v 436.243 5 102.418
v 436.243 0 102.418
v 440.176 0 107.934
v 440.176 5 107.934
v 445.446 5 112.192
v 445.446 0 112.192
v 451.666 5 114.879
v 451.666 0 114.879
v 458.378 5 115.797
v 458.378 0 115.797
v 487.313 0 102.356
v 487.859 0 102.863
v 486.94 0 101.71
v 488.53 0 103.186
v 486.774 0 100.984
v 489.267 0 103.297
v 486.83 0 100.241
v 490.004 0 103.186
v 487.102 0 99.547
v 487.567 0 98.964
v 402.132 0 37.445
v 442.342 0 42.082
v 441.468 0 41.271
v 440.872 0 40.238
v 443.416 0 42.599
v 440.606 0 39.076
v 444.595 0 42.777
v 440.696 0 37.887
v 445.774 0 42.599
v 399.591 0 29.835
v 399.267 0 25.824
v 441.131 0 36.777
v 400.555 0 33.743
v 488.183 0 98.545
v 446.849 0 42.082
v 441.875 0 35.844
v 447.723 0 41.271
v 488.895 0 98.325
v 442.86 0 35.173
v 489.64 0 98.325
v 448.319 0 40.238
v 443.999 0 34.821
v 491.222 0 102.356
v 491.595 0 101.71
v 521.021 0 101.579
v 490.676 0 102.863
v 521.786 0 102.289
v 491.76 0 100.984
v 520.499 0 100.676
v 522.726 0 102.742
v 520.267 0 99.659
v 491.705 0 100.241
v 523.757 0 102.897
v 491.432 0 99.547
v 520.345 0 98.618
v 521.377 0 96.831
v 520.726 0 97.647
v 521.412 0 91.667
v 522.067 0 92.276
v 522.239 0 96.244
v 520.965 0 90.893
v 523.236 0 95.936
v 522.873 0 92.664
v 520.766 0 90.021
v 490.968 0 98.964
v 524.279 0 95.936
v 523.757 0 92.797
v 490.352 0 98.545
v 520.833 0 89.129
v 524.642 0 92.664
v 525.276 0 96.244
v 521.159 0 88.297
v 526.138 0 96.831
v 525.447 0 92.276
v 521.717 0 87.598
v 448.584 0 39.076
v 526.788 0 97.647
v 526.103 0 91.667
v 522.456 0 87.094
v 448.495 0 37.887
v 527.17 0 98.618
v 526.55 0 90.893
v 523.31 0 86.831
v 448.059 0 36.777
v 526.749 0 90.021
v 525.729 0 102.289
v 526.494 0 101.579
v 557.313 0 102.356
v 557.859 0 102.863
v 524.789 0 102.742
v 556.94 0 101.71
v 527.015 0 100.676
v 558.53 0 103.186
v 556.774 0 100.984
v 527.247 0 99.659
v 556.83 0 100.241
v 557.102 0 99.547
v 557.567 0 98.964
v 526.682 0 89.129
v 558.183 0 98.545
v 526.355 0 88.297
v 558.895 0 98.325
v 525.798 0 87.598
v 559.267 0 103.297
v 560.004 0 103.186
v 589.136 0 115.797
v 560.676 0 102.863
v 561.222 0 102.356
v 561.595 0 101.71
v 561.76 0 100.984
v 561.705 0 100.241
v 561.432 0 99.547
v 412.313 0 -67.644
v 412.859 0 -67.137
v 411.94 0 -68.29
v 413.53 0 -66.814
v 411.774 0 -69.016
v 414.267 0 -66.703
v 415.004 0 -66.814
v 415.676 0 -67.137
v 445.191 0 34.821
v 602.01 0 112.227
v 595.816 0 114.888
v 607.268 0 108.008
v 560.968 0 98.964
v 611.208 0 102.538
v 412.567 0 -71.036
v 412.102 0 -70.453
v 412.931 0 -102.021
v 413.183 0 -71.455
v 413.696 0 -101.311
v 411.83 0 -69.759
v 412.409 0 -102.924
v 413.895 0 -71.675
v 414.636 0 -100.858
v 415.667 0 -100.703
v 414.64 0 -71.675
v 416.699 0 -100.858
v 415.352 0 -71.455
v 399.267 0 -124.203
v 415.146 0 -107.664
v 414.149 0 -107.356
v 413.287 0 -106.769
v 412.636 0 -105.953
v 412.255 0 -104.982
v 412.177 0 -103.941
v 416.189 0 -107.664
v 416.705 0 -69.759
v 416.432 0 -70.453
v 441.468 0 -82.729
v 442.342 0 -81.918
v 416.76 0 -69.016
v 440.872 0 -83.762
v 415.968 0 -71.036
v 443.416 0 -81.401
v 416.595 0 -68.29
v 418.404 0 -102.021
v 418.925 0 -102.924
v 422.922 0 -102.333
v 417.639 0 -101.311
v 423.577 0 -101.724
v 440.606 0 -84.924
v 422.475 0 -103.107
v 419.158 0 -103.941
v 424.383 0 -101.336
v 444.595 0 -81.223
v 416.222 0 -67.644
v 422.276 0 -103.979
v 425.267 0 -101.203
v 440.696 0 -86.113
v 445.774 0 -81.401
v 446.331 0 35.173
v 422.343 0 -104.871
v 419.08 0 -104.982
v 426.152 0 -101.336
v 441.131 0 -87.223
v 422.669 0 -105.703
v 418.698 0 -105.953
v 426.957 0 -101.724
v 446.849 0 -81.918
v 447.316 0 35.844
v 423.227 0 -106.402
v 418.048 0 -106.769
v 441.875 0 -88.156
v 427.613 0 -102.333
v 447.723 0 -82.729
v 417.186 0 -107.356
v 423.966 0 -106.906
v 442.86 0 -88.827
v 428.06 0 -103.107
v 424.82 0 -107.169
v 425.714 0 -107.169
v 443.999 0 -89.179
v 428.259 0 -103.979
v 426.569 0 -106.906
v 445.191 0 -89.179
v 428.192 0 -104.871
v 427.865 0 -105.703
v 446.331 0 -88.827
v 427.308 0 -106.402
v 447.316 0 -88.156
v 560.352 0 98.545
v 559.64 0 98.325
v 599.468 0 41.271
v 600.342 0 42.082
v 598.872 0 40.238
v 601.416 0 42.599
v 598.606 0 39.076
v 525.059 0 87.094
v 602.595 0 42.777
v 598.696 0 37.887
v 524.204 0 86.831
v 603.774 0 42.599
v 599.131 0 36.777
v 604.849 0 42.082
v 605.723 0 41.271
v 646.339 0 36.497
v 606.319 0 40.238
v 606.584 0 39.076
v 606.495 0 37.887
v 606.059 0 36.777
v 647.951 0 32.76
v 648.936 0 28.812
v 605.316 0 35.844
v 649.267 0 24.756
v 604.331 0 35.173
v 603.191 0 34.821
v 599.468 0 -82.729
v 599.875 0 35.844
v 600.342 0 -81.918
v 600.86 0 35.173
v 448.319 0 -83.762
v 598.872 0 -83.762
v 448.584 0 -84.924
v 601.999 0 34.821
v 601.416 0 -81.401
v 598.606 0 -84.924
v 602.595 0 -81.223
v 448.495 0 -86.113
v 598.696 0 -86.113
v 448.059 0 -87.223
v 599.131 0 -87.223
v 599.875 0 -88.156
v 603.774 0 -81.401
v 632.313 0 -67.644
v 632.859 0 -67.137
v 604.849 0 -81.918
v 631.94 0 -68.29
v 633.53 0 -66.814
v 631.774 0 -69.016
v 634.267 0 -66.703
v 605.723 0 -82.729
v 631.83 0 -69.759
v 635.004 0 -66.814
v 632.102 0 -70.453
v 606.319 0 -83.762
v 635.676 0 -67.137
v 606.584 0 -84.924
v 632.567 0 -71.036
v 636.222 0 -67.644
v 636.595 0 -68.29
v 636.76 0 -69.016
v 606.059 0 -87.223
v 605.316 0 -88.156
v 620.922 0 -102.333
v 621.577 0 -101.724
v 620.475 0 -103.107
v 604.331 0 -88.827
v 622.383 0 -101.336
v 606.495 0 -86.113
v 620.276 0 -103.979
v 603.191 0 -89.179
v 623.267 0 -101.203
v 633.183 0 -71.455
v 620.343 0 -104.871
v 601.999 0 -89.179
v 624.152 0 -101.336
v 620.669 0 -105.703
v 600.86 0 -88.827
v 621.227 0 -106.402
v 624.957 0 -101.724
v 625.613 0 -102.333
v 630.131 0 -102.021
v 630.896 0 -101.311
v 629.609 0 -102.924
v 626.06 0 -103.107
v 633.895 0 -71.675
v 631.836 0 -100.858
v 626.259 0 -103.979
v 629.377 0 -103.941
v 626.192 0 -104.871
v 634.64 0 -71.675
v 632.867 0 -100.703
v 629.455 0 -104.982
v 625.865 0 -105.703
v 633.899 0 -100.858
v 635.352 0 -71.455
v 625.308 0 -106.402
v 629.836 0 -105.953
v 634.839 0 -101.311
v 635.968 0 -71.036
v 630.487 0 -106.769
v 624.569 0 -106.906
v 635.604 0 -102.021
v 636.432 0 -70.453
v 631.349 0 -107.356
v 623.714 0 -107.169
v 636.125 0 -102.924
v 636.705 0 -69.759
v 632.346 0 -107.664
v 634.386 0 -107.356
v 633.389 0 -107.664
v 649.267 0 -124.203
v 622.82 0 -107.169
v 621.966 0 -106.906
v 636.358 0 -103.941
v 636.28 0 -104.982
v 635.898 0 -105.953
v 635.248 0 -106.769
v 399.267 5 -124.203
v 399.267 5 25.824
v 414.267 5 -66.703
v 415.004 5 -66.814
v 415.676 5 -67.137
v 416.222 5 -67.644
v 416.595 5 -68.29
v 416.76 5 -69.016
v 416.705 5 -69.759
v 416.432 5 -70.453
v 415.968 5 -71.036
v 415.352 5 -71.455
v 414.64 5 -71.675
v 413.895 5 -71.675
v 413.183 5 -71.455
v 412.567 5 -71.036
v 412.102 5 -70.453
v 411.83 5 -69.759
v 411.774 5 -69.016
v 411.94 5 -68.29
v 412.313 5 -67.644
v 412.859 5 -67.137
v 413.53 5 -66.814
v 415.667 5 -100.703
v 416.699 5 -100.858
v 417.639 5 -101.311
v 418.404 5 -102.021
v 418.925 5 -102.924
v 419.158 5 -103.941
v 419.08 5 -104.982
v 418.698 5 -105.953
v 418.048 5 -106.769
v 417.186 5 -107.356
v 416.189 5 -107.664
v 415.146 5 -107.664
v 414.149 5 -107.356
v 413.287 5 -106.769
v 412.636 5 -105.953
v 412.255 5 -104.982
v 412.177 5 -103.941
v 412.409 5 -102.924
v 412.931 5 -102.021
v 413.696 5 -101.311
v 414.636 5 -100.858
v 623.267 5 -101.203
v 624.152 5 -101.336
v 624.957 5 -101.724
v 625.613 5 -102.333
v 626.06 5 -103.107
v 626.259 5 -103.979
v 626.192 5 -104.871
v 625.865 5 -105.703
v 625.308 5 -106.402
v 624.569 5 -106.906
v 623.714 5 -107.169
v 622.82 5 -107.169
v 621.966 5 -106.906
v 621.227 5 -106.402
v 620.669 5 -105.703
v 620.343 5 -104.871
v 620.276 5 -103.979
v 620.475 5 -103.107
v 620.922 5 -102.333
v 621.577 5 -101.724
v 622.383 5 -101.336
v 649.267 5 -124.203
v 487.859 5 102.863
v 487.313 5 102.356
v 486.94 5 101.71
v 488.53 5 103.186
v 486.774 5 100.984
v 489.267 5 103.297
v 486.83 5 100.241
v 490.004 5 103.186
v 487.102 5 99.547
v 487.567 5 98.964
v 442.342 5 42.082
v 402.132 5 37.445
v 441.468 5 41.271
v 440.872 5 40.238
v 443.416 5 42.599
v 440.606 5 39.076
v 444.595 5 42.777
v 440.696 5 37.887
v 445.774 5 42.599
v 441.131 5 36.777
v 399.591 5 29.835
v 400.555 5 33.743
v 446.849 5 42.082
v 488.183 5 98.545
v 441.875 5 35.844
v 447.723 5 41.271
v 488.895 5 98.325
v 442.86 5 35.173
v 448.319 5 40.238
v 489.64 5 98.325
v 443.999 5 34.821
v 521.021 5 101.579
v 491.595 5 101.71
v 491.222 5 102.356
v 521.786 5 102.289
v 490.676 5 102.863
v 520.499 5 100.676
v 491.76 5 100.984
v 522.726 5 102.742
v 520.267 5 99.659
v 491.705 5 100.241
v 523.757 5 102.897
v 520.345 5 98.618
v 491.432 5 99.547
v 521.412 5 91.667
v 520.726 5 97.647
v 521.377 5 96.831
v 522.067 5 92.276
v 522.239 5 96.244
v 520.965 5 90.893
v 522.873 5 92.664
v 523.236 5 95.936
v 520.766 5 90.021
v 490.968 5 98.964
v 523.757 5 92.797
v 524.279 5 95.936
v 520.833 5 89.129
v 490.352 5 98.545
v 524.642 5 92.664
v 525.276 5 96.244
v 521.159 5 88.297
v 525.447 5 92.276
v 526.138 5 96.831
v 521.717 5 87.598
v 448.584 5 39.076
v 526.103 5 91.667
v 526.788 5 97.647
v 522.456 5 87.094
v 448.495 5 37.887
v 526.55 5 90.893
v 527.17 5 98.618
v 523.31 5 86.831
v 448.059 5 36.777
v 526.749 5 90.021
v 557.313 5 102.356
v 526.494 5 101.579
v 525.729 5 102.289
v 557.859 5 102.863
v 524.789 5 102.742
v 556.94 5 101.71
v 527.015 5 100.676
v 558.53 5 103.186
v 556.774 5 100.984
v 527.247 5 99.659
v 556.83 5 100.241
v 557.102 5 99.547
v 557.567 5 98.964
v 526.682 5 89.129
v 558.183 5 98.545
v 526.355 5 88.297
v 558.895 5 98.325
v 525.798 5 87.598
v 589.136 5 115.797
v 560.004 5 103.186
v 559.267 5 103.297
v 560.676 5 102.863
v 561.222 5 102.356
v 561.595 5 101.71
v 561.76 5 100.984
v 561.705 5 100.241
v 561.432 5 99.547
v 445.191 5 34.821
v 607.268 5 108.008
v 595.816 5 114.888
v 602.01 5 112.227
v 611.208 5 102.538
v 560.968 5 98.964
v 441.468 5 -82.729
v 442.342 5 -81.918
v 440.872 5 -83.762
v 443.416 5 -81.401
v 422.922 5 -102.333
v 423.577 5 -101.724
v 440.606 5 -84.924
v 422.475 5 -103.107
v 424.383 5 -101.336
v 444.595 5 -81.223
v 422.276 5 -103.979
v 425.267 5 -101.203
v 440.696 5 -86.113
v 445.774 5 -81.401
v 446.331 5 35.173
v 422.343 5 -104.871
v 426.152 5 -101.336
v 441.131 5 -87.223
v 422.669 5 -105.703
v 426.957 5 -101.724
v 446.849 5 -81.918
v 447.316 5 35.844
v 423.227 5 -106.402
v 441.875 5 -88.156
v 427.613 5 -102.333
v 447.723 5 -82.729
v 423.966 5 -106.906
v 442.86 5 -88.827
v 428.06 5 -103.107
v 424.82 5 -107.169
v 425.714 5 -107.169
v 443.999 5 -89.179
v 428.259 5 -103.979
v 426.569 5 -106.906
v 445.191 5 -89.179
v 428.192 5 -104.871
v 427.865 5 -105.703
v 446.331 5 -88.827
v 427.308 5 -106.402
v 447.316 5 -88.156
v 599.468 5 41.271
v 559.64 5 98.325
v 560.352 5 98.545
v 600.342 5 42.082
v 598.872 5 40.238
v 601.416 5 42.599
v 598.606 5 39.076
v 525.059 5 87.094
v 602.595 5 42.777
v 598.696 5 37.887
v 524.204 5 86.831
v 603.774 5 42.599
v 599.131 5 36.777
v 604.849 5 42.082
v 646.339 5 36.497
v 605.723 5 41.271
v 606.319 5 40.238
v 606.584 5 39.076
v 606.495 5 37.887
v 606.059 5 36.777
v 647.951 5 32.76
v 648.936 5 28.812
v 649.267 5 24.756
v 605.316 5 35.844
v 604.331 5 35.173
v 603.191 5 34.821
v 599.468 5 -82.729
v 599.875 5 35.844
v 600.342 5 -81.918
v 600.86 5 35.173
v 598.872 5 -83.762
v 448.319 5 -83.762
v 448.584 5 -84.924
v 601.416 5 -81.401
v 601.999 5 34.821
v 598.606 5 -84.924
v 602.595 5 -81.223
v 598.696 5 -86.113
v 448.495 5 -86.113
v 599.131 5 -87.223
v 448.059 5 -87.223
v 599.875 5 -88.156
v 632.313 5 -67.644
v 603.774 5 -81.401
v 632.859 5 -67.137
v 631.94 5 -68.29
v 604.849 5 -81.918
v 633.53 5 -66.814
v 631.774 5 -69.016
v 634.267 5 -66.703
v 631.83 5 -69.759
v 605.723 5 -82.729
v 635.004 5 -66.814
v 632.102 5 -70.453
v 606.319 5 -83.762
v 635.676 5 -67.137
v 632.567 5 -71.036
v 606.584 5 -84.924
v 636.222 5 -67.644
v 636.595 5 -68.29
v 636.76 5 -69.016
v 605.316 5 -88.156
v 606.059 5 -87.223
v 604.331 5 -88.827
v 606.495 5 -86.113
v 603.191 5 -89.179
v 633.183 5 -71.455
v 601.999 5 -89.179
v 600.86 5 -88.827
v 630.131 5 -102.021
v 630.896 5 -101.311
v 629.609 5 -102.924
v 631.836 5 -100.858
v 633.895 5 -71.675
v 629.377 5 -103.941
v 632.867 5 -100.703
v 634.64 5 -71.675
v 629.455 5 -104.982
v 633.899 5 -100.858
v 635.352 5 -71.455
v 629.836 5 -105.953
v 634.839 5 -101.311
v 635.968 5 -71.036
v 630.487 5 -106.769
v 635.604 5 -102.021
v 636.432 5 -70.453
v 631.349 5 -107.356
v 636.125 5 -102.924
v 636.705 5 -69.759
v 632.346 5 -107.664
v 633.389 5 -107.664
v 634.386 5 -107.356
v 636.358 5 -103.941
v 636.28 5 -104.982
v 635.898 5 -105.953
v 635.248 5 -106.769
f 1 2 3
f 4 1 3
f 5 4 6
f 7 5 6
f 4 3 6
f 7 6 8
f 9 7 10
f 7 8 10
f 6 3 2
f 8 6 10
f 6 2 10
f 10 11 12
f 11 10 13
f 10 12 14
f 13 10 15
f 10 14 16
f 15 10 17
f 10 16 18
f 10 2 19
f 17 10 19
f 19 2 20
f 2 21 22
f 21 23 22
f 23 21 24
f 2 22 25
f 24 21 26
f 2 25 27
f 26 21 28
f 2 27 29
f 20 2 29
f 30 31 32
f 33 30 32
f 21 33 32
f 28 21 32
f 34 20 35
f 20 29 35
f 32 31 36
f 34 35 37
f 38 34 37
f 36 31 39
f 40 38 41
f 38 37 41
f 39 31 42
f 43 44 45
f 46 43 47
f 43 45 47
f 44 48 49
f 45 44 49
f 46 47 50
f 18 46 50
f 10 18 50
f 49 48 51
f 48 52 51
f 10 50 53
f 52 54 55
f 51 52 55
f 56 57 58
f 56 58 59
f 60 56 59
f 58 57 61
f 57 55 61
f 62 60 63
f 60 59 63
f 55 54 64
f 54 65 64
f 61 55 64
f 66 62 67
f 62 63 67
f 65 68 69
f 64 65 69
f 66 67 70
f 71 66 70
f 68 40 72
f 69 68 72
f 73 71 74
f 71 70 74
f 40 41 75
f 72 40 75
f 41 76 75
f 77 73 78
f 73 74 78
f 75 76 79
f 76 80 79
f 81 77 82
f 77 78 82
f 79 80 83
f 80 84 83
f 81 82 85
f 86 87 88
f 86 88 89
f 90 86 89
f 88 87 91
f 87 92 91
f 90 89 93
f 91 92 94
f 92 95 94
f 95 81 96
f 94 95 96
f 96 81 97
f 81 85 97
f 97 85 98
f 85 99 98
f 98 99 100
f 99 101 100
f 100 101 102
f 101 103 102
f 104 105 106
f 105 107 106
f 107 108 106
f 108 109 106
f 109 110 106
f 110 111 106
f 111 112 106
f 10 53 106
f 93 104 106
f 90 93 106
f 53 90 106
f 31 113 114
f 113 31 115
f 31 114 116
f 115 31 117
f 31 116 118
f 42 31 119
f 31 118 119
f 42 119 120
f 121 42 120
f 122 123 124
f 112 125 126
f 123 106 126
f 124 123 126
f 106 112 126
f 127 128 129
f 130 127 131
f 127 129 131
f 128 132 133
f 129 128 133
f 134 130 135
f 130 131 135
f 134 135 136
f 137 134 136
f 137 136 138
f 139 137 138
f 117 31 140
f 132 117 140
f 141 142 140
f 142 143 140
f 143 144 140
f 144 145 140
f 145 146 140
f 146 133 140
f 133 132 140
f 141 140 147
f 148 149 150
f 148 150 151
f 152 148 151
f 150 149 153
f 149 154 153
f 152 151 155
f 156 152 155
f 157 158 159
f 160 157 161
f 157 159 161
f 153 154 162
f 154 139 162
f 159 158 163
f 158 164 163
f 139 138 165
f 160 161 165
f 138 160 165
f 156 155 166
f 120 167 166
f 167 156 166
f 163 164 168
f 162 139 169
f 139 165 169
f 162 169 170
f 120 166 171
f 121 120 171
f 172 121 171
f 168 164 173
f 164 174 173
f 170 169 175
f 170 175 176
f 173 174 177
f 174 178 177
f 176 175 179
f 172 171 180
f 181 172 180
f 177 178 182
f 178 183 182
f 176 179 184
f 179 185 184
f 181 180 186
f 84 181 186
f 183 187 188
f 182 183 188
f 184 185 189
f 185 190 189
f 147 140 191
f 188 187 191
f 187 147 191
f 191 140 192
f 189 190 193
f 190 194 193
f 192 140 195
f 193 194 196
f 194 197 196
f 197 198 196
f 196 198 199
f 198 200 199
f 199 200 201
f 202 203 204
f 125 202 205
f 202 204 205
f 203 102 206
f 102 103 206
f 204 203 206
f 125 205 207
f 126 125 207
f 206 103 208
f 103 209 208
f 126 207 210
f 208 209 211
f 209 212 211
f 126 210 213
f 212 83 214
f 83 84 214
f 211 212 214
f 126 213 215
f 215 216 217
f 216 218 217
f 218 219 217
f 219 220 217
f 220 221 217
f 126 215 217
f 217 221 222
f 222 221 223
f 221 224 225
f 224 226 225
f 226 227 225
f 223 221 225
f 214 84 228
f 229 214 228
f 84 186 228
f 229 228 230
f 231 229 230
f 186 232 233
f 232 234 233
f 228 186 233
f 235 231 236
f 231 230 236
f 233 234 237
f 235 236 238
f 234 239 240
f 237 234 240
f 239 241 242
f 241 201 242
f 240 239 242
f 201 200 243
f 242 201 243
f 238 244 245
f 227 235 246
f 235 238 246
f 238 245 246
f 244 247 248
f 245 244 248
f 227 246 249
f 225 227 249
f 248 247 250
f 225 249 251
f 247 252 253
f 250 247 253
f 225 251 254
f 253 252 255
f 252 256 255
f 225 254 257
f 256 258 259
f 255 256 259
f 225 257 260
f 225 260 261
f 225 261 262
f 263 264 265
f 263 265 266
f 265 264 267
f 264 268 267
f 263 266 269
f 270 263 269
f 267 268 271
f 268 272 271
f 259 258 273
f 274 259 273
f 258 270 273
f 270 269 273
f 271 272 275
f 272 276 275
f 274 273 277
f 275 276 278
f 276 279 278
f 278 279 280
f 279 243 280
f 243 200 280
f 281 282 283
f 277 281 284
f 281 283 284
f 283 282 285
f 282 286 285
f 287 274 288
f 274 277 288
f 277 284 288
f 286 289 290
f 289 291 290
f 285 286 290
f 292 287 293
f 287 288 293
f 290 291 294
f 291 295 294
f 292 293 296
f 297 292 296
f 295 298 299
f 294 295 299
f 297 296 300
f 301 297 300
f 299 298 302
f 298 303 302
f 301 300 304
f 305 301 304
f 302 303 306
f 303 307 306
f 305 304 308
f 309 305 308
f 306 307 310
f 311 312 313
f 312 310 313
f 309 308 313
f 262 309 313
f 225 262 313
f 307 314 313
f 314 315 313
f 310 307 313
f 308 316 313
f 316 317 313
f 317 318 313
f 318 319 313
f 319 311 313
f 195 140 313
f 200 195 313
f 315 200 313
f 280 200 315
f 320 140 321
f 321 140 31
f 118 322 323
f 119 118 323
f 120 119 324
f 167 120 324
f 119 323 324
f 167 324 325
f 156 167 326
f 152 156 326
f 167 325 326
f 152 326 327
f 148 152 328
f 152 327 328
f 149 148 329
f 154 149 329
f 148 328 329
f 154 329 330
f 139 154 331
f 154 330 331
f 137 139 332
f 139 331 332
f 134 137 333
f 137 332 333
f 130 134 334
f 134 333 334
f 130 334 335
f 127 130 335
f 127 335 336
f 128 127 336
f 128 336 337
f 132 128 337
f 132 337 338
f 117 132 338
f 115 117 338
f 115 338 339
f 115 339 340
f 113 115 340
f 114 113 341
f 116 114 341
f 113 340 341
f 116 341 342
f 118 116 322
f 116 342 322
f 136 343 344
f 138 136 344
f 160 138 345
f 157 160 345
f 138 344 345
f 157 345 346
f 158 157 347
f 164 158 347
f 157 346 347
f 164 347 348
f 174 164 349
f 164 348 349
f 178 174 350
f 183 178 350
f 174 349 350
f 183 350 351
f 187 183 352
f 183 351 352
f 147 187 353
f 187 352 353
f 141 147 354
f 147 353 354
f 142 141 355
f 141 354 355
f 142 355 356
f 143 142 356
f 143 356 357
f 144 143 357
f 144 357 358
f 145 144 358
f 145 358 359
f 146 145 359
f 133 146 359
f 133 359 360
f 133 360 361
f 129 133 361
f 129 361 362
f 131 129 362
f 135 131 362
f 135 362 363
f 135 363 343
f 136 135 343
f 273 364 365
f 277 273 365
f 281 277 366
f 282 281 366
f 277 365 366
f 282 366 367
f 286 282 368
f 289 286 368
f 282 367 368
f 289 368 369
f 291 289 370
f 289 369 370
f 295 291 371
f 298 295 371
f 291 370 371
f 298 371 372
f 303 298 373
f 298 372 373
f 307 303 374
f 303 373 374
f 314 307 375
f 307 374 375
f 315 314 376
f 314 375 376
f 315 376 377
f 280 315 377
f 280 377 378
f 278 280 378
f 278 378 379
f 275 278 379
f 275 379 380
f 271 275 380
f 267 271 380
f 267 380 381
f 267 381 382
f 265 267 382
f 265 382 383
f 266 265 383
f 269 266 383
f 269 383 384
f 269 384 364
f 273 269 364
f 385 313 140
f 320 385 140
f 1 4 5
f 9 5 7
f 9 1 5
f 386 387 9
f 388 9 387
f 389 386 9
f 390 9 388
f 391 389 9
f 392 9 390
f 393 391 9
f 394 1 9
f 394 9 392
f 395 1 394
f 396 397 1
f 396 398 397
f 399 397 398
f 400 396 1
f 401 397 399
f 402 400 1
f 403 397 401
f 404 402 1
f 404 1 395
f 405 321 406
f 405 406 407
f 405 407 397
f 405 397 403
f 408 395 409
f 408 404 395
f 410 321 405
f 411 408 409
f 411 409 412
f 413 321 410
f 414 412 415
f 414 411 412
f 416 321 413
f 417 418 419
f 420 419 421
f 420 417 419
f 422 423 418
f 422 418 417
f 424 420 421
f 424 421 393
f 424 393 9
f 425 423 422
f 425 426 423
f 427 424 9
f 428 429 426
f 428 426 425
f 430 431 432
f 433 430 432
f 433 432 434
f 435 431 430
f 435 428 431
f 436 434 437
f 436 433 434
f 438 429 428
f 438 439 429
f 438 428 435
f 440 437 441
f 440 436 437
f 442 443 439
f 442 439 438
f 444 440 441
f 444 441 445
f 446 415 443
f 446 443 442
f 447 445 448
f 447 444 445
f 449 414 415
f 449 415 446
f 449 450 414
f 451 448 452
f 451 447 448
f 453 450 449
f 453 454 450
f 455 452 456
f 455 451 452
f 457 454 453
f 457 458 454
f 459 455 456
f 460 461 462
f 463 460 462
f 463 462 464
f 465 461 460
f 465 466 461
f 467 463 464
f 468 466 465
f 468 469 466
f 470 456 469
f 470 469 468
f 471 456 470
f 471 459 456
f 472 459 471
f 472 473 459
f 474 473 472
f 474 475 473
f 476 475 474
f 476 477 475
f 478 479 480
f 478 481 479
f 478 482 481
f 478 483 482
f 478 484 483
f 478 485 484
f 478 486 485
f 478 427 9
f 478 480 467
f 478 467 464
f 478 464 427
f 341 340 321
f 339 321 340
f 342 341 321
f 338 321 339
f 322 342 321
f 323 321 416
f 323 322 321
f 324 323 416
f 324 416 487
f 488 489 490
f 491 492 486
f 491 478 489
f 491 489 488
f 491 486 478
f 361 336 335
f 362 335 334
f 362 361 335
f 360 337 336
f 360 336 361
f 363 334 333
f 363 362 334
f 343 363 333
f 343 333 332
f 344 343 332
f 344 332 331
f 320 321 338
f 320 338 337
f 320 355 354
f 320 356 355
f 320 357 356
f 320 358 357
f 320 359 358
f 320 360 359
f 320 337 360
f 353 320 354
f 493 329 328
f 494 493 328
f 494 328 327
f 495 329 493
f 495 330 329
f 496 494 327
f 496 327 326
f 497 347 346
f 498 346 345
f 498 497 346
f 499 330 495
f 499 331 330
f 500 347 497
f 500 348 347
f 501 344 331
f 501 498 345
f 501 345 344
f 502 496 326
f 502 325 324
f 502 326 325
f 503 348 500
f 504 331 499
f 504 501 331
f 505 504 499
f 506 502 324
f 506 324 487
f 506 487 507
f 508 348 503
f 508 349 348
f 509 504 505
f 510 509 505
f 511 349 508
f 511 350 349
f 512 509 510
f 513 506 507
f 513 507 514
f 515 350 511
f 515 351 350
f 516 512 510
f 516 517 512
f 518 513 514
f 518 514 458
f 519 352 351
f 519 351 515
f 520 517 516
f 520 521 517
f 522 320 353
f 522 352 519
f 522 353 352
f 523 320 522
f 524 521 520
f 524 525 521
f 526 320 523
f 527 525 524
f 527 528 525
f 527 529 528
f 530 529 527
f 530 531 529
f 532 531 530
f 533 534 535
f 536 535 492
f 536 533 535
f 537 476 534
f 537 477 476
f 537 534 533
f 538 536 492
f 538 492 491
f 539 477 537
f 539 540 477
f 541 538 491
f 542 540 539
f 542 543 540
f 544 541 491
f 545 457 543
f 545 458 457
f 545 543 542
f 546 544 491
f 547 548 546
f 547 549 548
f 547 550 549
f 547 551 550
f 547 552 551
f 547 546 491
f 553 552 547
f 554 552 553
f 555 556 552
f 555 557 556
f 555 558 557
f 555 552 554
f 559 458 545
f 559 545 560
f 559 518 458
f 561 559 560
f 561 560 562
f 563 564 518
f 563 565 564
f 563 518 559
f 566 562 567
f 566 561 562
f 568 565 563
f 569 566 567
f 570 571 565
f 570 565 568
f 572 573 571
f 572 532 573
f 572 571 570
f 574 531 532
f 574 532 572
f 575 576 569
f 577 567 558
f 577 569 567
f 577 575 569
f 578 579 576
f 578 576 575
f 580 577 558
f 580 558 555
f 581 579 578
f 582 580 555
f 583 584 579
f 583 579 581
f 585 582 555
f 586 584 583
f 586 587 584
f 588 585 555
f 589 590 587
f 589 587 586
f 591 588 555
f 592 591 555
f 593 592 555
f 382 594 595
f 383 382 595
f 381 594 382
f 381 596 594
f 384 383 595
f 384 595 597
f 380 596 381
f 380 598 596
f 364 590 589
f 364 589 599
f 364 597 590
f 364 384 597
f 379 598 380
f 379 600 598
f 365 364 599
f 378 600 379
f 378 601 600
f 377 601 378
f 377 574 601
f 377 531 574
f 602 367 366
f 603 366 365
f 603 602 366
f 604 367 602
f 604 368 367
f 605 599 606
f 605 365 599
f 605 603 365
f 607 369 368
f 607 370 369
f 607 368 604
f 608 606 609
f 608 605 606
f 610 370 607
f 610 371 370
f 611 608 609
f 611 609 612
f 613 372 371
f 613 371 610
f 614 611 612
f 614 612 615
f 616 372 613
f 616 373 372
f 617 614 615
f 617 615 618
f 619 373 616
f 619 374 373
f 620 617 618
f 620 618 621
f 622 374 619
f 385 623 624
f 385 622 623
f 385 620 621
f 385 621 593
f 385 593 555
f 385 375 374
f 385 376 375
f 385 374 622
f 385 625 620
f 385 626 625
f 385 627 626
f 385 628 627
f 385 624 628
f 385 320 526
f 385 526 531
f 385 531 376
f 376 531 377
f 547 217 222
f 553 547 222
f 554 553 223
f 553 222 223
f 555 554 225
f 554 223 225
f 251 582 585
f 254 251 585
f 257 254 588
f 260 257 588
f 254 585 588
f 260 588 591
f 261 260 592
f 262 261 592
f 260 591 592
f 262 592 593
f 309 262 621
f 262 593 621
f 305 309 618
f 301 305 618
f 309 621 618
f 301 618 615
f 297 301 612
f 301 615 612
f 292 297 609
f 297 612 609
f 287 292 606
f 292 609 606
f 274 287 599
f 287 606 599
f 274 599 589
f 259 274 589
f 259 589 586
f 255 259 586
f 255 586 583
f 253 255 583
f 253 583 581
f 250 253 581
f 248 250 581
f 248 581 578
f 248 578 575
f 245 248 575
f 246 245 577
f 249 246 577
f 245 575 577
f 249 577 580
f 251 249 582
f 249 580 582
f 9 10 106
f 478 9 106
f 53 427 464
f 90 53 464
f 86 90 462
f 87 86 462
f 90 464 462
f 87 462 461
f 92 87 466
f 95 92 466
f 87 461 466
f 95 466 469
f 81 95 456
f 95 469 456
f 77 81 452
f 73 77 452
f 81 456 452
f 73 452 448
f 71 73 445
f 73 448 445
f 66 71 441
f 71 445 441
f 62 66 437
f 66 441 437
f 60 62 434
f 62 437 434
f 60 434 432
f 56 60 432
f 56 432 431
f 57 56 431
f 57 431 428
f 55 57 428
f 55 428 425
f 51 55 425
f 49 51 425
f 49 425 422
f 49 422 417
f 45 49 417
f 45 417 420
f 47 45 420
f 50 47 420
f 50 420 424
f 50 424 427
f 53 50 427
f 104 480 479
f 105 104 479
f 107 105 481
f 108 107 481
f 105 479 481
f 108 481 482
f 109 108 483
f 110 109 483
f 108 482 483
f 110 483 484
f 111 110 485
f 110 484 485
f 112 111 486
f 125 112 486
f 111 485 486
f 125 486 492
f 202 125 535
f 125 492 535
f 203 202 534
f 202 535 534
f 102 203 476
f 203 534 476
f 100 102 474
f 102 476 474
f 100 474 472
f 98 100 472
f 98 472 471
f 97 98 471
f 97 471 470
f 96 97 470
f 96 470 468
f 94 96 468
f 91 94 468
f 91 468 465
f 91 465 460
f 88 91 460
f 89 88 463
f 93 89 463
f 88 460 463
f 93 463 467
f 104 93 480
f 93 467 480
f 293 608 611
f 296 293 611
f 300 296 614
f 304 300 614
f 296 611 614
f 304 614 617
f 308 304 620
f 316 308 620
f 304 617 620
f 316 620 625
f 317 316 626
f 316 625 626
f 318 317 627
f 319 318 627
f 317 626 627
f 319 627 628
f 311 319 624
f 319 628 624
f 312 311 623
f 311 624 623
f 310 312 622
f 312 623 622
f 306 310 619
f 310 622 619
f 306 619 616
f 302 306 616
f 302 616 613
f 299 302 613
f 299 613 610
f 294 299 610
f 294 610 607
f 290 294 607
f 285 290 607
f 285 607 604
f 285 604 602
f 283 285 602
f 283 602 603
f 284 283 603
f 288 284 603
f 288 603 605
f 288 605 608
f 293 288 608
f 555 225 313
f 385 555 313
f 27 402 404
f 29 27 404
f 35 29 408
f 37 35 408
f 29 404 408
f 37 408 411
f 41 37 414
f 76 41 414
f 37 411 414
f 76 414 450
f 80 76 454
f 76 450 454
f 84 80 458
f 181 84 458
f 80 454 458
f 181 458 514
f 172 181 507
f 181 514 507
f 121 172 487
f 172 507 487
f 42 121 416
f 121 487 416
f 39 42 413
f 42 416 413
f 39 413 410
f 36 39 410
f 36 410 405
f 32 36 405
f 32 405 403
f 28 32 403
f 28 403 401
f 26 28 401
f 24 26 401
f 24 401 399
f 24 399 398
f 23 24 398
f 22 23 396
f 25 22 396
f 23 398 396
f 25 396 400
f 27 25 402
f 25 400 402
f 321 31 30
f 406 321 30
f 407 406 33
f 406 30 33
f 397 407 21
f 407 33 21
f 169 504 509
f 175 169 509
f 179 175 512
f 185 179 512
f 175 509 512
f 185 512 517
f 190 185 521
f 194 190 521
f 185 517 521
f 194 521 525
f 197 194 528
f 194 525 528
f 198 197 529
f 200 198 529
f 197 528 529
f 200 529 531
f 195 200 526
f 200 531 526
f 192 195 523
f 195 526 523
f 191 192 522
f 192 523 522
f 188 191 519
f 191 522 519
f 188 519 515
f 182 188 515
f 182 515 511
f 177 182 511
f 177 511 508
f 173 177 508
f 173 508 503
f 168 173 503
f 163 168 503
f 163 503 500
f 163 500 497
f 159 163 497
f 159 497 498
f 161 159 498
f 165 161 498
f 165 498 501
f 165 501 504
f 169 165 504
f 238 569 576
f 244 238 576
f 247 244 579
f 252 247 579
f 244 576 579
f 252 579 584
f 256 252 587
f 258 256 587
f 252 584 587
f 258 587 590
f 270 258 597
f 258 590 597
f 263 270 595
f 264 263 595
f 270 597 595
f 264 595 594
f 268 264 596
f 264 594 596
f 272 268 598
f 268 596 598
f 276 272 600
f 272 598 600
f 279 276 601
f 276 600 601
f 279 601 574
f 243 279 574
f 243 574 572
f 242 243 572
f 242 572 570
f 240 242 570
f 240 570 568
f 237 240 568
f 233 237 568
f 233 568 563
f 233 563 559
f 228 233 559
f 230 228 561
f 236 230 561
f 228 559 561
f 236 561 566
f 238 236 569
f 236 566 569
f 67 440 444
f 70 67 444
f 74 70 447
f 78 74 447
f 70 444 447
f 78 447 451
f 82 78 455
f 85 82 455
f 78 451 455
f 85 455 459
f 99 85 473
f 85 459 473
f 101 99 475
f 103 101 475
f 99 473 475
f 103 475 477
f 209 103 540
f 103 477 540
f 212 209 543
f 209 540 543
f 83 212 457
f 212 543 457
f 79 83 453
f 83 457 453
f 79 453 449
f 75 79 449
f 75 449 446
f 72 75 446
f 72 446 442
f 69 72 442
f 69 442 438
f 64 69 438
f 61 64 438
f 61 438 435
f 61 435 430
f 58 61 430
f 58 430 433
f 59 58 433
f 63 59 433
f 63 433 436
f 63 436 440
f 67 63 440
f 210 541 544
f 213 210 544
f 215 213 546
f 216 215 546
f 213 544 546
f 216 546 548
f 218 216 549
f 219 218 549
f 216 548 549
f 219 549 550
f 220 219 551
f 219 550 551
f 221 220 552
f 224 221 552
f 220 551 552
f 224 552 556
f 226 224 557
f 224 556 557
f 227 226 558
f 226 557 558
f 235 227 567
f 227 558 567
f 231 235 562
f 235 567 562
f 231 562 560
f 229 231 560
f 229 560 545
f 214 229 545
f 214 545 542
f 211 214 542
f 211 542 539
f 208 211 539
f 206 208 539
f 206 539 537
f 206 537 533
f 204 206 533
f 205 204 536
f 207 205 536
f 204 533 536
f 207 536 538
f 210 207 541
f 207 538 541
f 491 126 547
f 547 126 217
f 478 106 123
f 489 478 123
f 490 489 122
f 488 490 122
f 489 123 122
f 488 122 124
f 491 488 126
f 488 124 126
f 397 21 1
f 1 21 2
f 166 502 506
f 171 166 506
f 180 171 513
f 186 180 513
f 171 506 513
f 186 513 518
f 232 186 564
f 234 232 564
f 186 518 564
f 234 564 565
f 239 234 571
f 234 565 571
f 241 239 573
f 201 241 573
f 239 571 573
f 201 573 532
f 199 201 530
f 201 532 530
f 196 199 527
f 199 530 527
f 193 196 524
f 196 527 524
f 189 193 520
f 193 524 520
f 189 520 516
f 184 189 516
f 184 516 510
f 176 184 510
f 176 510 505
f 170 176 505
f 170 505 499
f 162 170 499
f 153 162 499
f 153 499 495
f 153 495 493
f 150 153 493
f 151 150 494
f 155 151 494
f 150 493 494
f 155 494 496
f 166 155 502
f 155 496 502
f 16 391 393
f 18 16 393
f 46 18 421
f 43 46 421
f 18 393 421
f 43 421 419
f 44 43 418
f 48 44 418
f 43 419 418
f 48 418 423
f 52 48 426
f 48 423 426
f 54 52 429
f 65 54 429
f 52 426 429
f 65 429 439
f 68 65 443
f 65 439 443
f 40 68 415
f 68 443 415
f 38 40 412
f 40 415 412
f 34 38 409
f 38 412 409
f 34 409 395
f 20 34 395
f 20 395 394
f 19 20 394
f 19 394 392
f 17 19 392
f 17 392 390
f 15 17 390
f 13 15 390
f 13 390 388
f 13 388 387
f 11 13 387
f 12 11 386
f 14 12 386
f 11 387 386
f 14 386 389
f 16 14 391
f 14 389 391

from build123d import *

# Parameters (mm, degrees)
RESSALTO_EXTRUS_O4_DEPTH = 5
ESBO_O2_R                = 2.5
CORTE_EXTRUS_O1_DEPTH    = 5
ESBO_O3_R                = 4
CORTE_EXTRUS_O2_DEPTH    = 5
ESBO_O4_R                = 3.5
ESBO_O4_R_2              = 3
CORTE_EXTRUS_O3_DEPTH    = 10


with BuildPart() as part:
    # Esboço1 → Ressalto-extrusão4 (new body)
    with BuildSketch(Plane(origin=(0, 0, 0), x_dir=(1, 0, 0), z_dir=(0, 1, 0))):
        with BuildLine():
            Line((649.267355398, 124.203004206), (399.267355398, 124.203004206))
            Line((399.267355398, 124.203004206), (399.267355398, 84.203004206))
            Line((399.267355398, 84.203004206), (399.267355398, -25.823867232))
            ThreePointArc((399.267355398, -25.823867232), (399.994184105, -31.80827659), (402.132407827, -37.444714707))
            Line((402.132407827, -37.444714707), (436.243300323, -102.417843269))
            ThreePointArc((436.243300323, -102.417843269), (445.44614031, -112.192336255), (458.378247894, -115.796995794))
            Line((458.378247894, -115.796995794), (504.267355398, -115.796995794))
            Line((504.267355398, -115.796995794), (544.267355398, -115.796995794))
            Line((544.267355398, -115.796995794), (589.136322684, -115.796995794))
            ThreePointArc((589.136322684, -115.796995794), (602.010224955, -112.227409704), (611.207767027, -102.53800702))
            Line((611.207767027, -102.53800702), (646.338799741, -36.496622823))
            ThreePointArc((646.338799741, -36.496622823), (648.524169993, -30.805979), (649.267355398, -24.755611597))
            Line((649.267355398, -24.755611597), (649.267355398, 84.203004206))
            Line((649.267355398, 84.203004206), (649.267355398, 124.203004206))
        make_face()
    extrude(amount=RESSALTO_EXTRUS_O4_DEPTH)

    # Esboço2 → Corte-extrusão1 (cut)
    with BuildSketch(Plane(origin=(0, 5, 0), x_dir=(1, 0, 0), z_dir=(0, 1, 0))):
        with Locations(Location((559.267355398, -100.796995794, 0), (0, 0, 270))):
            Circle(ESBO_O2_R)
        with Locations(Location((489.267355398, -100.796995794, 0), (0, 0, 270))):
            Circle(ESBO_O2_R)
        with Locations(Location((634.267355398, 69.203004206, 0), (0, 0, 270))):
            Circle(ESBO_O2_R)
        with Locations(Location((414.267355398, 69.203004206, 0), (0, 0, 270))):
            Circle(ESBO_O2_R)
    extrude(amount=-CORTE_EXTRUS_O1_DEPTH, mode=Mode.SUBTRACT)

    # Esboço3 → Corte-extrusão2 (cut)
    with BuildSketch(Plane(origin=(0, 5, 0), x_dir=(1, 0, 0), z_dir=(0, 1, 0))):
        with Locations(Location((602.59531099, 85.223299861, 0), (0, 0, 270))):
            Circle(ESBO_O3_R)
        with Locations(Location((444.59531099, 85.223299861, 0), (0, 0, 270))):
            Circle(ESBO_O3_R)
        with Locations(Location((602.59531099, -38.776700139, 0), (0, 0, 270))):
            Circle(ESBO_O3_R)
        with Locations(Location((444.59531099, -38.776700139, 0), (0, 0, 270))):
            Circle(ESBO_O3_R)
    extrude(amount=-CORTE_EXTRUS_O2_DEPTH, mode=Mode.SUBTRACT)

    # Esboço4 → Corte-extrusão3 (cut)
    with BuildSketch(Plane(origin=(0, 5, 0), x_dir=(1, 0, 0), z_dir=(0, 1, 0))):
        with Locations(Location((523.757285289, -99.396995794, 0), (0, 0, 270))):
            Circle(ESBO_O4_R)
        with Locations(Location((632.867355398, 104.203004206, 0), (0, 0, 270))):
            Circle(ESBO_O4_R)
        with Locations(Location((415.667355398, 104.203004206, 0), (0, 0, 270))):
            Circle(ESBO_O4_R)
        with Locations(Location((623.267355398, 104.203004206, 0), (0, 0, 270))):
            Circle(ESBO_O4_R_2)
        with Locations(Location((425.267355398, 104.203004206, 0), (0, 0, 270))):
            Circle(ESBO_O4_R_2)
        with Locations(Location((523.757285289, -89.796995794, 0), (0, 0, 270))):
            Circle(ESBO_O4_R_2)
    extrude(amount=-CORTE_EXTRUS_O3_DEPTH, mode=Mode.SUBTRACT)


solid = part.part
